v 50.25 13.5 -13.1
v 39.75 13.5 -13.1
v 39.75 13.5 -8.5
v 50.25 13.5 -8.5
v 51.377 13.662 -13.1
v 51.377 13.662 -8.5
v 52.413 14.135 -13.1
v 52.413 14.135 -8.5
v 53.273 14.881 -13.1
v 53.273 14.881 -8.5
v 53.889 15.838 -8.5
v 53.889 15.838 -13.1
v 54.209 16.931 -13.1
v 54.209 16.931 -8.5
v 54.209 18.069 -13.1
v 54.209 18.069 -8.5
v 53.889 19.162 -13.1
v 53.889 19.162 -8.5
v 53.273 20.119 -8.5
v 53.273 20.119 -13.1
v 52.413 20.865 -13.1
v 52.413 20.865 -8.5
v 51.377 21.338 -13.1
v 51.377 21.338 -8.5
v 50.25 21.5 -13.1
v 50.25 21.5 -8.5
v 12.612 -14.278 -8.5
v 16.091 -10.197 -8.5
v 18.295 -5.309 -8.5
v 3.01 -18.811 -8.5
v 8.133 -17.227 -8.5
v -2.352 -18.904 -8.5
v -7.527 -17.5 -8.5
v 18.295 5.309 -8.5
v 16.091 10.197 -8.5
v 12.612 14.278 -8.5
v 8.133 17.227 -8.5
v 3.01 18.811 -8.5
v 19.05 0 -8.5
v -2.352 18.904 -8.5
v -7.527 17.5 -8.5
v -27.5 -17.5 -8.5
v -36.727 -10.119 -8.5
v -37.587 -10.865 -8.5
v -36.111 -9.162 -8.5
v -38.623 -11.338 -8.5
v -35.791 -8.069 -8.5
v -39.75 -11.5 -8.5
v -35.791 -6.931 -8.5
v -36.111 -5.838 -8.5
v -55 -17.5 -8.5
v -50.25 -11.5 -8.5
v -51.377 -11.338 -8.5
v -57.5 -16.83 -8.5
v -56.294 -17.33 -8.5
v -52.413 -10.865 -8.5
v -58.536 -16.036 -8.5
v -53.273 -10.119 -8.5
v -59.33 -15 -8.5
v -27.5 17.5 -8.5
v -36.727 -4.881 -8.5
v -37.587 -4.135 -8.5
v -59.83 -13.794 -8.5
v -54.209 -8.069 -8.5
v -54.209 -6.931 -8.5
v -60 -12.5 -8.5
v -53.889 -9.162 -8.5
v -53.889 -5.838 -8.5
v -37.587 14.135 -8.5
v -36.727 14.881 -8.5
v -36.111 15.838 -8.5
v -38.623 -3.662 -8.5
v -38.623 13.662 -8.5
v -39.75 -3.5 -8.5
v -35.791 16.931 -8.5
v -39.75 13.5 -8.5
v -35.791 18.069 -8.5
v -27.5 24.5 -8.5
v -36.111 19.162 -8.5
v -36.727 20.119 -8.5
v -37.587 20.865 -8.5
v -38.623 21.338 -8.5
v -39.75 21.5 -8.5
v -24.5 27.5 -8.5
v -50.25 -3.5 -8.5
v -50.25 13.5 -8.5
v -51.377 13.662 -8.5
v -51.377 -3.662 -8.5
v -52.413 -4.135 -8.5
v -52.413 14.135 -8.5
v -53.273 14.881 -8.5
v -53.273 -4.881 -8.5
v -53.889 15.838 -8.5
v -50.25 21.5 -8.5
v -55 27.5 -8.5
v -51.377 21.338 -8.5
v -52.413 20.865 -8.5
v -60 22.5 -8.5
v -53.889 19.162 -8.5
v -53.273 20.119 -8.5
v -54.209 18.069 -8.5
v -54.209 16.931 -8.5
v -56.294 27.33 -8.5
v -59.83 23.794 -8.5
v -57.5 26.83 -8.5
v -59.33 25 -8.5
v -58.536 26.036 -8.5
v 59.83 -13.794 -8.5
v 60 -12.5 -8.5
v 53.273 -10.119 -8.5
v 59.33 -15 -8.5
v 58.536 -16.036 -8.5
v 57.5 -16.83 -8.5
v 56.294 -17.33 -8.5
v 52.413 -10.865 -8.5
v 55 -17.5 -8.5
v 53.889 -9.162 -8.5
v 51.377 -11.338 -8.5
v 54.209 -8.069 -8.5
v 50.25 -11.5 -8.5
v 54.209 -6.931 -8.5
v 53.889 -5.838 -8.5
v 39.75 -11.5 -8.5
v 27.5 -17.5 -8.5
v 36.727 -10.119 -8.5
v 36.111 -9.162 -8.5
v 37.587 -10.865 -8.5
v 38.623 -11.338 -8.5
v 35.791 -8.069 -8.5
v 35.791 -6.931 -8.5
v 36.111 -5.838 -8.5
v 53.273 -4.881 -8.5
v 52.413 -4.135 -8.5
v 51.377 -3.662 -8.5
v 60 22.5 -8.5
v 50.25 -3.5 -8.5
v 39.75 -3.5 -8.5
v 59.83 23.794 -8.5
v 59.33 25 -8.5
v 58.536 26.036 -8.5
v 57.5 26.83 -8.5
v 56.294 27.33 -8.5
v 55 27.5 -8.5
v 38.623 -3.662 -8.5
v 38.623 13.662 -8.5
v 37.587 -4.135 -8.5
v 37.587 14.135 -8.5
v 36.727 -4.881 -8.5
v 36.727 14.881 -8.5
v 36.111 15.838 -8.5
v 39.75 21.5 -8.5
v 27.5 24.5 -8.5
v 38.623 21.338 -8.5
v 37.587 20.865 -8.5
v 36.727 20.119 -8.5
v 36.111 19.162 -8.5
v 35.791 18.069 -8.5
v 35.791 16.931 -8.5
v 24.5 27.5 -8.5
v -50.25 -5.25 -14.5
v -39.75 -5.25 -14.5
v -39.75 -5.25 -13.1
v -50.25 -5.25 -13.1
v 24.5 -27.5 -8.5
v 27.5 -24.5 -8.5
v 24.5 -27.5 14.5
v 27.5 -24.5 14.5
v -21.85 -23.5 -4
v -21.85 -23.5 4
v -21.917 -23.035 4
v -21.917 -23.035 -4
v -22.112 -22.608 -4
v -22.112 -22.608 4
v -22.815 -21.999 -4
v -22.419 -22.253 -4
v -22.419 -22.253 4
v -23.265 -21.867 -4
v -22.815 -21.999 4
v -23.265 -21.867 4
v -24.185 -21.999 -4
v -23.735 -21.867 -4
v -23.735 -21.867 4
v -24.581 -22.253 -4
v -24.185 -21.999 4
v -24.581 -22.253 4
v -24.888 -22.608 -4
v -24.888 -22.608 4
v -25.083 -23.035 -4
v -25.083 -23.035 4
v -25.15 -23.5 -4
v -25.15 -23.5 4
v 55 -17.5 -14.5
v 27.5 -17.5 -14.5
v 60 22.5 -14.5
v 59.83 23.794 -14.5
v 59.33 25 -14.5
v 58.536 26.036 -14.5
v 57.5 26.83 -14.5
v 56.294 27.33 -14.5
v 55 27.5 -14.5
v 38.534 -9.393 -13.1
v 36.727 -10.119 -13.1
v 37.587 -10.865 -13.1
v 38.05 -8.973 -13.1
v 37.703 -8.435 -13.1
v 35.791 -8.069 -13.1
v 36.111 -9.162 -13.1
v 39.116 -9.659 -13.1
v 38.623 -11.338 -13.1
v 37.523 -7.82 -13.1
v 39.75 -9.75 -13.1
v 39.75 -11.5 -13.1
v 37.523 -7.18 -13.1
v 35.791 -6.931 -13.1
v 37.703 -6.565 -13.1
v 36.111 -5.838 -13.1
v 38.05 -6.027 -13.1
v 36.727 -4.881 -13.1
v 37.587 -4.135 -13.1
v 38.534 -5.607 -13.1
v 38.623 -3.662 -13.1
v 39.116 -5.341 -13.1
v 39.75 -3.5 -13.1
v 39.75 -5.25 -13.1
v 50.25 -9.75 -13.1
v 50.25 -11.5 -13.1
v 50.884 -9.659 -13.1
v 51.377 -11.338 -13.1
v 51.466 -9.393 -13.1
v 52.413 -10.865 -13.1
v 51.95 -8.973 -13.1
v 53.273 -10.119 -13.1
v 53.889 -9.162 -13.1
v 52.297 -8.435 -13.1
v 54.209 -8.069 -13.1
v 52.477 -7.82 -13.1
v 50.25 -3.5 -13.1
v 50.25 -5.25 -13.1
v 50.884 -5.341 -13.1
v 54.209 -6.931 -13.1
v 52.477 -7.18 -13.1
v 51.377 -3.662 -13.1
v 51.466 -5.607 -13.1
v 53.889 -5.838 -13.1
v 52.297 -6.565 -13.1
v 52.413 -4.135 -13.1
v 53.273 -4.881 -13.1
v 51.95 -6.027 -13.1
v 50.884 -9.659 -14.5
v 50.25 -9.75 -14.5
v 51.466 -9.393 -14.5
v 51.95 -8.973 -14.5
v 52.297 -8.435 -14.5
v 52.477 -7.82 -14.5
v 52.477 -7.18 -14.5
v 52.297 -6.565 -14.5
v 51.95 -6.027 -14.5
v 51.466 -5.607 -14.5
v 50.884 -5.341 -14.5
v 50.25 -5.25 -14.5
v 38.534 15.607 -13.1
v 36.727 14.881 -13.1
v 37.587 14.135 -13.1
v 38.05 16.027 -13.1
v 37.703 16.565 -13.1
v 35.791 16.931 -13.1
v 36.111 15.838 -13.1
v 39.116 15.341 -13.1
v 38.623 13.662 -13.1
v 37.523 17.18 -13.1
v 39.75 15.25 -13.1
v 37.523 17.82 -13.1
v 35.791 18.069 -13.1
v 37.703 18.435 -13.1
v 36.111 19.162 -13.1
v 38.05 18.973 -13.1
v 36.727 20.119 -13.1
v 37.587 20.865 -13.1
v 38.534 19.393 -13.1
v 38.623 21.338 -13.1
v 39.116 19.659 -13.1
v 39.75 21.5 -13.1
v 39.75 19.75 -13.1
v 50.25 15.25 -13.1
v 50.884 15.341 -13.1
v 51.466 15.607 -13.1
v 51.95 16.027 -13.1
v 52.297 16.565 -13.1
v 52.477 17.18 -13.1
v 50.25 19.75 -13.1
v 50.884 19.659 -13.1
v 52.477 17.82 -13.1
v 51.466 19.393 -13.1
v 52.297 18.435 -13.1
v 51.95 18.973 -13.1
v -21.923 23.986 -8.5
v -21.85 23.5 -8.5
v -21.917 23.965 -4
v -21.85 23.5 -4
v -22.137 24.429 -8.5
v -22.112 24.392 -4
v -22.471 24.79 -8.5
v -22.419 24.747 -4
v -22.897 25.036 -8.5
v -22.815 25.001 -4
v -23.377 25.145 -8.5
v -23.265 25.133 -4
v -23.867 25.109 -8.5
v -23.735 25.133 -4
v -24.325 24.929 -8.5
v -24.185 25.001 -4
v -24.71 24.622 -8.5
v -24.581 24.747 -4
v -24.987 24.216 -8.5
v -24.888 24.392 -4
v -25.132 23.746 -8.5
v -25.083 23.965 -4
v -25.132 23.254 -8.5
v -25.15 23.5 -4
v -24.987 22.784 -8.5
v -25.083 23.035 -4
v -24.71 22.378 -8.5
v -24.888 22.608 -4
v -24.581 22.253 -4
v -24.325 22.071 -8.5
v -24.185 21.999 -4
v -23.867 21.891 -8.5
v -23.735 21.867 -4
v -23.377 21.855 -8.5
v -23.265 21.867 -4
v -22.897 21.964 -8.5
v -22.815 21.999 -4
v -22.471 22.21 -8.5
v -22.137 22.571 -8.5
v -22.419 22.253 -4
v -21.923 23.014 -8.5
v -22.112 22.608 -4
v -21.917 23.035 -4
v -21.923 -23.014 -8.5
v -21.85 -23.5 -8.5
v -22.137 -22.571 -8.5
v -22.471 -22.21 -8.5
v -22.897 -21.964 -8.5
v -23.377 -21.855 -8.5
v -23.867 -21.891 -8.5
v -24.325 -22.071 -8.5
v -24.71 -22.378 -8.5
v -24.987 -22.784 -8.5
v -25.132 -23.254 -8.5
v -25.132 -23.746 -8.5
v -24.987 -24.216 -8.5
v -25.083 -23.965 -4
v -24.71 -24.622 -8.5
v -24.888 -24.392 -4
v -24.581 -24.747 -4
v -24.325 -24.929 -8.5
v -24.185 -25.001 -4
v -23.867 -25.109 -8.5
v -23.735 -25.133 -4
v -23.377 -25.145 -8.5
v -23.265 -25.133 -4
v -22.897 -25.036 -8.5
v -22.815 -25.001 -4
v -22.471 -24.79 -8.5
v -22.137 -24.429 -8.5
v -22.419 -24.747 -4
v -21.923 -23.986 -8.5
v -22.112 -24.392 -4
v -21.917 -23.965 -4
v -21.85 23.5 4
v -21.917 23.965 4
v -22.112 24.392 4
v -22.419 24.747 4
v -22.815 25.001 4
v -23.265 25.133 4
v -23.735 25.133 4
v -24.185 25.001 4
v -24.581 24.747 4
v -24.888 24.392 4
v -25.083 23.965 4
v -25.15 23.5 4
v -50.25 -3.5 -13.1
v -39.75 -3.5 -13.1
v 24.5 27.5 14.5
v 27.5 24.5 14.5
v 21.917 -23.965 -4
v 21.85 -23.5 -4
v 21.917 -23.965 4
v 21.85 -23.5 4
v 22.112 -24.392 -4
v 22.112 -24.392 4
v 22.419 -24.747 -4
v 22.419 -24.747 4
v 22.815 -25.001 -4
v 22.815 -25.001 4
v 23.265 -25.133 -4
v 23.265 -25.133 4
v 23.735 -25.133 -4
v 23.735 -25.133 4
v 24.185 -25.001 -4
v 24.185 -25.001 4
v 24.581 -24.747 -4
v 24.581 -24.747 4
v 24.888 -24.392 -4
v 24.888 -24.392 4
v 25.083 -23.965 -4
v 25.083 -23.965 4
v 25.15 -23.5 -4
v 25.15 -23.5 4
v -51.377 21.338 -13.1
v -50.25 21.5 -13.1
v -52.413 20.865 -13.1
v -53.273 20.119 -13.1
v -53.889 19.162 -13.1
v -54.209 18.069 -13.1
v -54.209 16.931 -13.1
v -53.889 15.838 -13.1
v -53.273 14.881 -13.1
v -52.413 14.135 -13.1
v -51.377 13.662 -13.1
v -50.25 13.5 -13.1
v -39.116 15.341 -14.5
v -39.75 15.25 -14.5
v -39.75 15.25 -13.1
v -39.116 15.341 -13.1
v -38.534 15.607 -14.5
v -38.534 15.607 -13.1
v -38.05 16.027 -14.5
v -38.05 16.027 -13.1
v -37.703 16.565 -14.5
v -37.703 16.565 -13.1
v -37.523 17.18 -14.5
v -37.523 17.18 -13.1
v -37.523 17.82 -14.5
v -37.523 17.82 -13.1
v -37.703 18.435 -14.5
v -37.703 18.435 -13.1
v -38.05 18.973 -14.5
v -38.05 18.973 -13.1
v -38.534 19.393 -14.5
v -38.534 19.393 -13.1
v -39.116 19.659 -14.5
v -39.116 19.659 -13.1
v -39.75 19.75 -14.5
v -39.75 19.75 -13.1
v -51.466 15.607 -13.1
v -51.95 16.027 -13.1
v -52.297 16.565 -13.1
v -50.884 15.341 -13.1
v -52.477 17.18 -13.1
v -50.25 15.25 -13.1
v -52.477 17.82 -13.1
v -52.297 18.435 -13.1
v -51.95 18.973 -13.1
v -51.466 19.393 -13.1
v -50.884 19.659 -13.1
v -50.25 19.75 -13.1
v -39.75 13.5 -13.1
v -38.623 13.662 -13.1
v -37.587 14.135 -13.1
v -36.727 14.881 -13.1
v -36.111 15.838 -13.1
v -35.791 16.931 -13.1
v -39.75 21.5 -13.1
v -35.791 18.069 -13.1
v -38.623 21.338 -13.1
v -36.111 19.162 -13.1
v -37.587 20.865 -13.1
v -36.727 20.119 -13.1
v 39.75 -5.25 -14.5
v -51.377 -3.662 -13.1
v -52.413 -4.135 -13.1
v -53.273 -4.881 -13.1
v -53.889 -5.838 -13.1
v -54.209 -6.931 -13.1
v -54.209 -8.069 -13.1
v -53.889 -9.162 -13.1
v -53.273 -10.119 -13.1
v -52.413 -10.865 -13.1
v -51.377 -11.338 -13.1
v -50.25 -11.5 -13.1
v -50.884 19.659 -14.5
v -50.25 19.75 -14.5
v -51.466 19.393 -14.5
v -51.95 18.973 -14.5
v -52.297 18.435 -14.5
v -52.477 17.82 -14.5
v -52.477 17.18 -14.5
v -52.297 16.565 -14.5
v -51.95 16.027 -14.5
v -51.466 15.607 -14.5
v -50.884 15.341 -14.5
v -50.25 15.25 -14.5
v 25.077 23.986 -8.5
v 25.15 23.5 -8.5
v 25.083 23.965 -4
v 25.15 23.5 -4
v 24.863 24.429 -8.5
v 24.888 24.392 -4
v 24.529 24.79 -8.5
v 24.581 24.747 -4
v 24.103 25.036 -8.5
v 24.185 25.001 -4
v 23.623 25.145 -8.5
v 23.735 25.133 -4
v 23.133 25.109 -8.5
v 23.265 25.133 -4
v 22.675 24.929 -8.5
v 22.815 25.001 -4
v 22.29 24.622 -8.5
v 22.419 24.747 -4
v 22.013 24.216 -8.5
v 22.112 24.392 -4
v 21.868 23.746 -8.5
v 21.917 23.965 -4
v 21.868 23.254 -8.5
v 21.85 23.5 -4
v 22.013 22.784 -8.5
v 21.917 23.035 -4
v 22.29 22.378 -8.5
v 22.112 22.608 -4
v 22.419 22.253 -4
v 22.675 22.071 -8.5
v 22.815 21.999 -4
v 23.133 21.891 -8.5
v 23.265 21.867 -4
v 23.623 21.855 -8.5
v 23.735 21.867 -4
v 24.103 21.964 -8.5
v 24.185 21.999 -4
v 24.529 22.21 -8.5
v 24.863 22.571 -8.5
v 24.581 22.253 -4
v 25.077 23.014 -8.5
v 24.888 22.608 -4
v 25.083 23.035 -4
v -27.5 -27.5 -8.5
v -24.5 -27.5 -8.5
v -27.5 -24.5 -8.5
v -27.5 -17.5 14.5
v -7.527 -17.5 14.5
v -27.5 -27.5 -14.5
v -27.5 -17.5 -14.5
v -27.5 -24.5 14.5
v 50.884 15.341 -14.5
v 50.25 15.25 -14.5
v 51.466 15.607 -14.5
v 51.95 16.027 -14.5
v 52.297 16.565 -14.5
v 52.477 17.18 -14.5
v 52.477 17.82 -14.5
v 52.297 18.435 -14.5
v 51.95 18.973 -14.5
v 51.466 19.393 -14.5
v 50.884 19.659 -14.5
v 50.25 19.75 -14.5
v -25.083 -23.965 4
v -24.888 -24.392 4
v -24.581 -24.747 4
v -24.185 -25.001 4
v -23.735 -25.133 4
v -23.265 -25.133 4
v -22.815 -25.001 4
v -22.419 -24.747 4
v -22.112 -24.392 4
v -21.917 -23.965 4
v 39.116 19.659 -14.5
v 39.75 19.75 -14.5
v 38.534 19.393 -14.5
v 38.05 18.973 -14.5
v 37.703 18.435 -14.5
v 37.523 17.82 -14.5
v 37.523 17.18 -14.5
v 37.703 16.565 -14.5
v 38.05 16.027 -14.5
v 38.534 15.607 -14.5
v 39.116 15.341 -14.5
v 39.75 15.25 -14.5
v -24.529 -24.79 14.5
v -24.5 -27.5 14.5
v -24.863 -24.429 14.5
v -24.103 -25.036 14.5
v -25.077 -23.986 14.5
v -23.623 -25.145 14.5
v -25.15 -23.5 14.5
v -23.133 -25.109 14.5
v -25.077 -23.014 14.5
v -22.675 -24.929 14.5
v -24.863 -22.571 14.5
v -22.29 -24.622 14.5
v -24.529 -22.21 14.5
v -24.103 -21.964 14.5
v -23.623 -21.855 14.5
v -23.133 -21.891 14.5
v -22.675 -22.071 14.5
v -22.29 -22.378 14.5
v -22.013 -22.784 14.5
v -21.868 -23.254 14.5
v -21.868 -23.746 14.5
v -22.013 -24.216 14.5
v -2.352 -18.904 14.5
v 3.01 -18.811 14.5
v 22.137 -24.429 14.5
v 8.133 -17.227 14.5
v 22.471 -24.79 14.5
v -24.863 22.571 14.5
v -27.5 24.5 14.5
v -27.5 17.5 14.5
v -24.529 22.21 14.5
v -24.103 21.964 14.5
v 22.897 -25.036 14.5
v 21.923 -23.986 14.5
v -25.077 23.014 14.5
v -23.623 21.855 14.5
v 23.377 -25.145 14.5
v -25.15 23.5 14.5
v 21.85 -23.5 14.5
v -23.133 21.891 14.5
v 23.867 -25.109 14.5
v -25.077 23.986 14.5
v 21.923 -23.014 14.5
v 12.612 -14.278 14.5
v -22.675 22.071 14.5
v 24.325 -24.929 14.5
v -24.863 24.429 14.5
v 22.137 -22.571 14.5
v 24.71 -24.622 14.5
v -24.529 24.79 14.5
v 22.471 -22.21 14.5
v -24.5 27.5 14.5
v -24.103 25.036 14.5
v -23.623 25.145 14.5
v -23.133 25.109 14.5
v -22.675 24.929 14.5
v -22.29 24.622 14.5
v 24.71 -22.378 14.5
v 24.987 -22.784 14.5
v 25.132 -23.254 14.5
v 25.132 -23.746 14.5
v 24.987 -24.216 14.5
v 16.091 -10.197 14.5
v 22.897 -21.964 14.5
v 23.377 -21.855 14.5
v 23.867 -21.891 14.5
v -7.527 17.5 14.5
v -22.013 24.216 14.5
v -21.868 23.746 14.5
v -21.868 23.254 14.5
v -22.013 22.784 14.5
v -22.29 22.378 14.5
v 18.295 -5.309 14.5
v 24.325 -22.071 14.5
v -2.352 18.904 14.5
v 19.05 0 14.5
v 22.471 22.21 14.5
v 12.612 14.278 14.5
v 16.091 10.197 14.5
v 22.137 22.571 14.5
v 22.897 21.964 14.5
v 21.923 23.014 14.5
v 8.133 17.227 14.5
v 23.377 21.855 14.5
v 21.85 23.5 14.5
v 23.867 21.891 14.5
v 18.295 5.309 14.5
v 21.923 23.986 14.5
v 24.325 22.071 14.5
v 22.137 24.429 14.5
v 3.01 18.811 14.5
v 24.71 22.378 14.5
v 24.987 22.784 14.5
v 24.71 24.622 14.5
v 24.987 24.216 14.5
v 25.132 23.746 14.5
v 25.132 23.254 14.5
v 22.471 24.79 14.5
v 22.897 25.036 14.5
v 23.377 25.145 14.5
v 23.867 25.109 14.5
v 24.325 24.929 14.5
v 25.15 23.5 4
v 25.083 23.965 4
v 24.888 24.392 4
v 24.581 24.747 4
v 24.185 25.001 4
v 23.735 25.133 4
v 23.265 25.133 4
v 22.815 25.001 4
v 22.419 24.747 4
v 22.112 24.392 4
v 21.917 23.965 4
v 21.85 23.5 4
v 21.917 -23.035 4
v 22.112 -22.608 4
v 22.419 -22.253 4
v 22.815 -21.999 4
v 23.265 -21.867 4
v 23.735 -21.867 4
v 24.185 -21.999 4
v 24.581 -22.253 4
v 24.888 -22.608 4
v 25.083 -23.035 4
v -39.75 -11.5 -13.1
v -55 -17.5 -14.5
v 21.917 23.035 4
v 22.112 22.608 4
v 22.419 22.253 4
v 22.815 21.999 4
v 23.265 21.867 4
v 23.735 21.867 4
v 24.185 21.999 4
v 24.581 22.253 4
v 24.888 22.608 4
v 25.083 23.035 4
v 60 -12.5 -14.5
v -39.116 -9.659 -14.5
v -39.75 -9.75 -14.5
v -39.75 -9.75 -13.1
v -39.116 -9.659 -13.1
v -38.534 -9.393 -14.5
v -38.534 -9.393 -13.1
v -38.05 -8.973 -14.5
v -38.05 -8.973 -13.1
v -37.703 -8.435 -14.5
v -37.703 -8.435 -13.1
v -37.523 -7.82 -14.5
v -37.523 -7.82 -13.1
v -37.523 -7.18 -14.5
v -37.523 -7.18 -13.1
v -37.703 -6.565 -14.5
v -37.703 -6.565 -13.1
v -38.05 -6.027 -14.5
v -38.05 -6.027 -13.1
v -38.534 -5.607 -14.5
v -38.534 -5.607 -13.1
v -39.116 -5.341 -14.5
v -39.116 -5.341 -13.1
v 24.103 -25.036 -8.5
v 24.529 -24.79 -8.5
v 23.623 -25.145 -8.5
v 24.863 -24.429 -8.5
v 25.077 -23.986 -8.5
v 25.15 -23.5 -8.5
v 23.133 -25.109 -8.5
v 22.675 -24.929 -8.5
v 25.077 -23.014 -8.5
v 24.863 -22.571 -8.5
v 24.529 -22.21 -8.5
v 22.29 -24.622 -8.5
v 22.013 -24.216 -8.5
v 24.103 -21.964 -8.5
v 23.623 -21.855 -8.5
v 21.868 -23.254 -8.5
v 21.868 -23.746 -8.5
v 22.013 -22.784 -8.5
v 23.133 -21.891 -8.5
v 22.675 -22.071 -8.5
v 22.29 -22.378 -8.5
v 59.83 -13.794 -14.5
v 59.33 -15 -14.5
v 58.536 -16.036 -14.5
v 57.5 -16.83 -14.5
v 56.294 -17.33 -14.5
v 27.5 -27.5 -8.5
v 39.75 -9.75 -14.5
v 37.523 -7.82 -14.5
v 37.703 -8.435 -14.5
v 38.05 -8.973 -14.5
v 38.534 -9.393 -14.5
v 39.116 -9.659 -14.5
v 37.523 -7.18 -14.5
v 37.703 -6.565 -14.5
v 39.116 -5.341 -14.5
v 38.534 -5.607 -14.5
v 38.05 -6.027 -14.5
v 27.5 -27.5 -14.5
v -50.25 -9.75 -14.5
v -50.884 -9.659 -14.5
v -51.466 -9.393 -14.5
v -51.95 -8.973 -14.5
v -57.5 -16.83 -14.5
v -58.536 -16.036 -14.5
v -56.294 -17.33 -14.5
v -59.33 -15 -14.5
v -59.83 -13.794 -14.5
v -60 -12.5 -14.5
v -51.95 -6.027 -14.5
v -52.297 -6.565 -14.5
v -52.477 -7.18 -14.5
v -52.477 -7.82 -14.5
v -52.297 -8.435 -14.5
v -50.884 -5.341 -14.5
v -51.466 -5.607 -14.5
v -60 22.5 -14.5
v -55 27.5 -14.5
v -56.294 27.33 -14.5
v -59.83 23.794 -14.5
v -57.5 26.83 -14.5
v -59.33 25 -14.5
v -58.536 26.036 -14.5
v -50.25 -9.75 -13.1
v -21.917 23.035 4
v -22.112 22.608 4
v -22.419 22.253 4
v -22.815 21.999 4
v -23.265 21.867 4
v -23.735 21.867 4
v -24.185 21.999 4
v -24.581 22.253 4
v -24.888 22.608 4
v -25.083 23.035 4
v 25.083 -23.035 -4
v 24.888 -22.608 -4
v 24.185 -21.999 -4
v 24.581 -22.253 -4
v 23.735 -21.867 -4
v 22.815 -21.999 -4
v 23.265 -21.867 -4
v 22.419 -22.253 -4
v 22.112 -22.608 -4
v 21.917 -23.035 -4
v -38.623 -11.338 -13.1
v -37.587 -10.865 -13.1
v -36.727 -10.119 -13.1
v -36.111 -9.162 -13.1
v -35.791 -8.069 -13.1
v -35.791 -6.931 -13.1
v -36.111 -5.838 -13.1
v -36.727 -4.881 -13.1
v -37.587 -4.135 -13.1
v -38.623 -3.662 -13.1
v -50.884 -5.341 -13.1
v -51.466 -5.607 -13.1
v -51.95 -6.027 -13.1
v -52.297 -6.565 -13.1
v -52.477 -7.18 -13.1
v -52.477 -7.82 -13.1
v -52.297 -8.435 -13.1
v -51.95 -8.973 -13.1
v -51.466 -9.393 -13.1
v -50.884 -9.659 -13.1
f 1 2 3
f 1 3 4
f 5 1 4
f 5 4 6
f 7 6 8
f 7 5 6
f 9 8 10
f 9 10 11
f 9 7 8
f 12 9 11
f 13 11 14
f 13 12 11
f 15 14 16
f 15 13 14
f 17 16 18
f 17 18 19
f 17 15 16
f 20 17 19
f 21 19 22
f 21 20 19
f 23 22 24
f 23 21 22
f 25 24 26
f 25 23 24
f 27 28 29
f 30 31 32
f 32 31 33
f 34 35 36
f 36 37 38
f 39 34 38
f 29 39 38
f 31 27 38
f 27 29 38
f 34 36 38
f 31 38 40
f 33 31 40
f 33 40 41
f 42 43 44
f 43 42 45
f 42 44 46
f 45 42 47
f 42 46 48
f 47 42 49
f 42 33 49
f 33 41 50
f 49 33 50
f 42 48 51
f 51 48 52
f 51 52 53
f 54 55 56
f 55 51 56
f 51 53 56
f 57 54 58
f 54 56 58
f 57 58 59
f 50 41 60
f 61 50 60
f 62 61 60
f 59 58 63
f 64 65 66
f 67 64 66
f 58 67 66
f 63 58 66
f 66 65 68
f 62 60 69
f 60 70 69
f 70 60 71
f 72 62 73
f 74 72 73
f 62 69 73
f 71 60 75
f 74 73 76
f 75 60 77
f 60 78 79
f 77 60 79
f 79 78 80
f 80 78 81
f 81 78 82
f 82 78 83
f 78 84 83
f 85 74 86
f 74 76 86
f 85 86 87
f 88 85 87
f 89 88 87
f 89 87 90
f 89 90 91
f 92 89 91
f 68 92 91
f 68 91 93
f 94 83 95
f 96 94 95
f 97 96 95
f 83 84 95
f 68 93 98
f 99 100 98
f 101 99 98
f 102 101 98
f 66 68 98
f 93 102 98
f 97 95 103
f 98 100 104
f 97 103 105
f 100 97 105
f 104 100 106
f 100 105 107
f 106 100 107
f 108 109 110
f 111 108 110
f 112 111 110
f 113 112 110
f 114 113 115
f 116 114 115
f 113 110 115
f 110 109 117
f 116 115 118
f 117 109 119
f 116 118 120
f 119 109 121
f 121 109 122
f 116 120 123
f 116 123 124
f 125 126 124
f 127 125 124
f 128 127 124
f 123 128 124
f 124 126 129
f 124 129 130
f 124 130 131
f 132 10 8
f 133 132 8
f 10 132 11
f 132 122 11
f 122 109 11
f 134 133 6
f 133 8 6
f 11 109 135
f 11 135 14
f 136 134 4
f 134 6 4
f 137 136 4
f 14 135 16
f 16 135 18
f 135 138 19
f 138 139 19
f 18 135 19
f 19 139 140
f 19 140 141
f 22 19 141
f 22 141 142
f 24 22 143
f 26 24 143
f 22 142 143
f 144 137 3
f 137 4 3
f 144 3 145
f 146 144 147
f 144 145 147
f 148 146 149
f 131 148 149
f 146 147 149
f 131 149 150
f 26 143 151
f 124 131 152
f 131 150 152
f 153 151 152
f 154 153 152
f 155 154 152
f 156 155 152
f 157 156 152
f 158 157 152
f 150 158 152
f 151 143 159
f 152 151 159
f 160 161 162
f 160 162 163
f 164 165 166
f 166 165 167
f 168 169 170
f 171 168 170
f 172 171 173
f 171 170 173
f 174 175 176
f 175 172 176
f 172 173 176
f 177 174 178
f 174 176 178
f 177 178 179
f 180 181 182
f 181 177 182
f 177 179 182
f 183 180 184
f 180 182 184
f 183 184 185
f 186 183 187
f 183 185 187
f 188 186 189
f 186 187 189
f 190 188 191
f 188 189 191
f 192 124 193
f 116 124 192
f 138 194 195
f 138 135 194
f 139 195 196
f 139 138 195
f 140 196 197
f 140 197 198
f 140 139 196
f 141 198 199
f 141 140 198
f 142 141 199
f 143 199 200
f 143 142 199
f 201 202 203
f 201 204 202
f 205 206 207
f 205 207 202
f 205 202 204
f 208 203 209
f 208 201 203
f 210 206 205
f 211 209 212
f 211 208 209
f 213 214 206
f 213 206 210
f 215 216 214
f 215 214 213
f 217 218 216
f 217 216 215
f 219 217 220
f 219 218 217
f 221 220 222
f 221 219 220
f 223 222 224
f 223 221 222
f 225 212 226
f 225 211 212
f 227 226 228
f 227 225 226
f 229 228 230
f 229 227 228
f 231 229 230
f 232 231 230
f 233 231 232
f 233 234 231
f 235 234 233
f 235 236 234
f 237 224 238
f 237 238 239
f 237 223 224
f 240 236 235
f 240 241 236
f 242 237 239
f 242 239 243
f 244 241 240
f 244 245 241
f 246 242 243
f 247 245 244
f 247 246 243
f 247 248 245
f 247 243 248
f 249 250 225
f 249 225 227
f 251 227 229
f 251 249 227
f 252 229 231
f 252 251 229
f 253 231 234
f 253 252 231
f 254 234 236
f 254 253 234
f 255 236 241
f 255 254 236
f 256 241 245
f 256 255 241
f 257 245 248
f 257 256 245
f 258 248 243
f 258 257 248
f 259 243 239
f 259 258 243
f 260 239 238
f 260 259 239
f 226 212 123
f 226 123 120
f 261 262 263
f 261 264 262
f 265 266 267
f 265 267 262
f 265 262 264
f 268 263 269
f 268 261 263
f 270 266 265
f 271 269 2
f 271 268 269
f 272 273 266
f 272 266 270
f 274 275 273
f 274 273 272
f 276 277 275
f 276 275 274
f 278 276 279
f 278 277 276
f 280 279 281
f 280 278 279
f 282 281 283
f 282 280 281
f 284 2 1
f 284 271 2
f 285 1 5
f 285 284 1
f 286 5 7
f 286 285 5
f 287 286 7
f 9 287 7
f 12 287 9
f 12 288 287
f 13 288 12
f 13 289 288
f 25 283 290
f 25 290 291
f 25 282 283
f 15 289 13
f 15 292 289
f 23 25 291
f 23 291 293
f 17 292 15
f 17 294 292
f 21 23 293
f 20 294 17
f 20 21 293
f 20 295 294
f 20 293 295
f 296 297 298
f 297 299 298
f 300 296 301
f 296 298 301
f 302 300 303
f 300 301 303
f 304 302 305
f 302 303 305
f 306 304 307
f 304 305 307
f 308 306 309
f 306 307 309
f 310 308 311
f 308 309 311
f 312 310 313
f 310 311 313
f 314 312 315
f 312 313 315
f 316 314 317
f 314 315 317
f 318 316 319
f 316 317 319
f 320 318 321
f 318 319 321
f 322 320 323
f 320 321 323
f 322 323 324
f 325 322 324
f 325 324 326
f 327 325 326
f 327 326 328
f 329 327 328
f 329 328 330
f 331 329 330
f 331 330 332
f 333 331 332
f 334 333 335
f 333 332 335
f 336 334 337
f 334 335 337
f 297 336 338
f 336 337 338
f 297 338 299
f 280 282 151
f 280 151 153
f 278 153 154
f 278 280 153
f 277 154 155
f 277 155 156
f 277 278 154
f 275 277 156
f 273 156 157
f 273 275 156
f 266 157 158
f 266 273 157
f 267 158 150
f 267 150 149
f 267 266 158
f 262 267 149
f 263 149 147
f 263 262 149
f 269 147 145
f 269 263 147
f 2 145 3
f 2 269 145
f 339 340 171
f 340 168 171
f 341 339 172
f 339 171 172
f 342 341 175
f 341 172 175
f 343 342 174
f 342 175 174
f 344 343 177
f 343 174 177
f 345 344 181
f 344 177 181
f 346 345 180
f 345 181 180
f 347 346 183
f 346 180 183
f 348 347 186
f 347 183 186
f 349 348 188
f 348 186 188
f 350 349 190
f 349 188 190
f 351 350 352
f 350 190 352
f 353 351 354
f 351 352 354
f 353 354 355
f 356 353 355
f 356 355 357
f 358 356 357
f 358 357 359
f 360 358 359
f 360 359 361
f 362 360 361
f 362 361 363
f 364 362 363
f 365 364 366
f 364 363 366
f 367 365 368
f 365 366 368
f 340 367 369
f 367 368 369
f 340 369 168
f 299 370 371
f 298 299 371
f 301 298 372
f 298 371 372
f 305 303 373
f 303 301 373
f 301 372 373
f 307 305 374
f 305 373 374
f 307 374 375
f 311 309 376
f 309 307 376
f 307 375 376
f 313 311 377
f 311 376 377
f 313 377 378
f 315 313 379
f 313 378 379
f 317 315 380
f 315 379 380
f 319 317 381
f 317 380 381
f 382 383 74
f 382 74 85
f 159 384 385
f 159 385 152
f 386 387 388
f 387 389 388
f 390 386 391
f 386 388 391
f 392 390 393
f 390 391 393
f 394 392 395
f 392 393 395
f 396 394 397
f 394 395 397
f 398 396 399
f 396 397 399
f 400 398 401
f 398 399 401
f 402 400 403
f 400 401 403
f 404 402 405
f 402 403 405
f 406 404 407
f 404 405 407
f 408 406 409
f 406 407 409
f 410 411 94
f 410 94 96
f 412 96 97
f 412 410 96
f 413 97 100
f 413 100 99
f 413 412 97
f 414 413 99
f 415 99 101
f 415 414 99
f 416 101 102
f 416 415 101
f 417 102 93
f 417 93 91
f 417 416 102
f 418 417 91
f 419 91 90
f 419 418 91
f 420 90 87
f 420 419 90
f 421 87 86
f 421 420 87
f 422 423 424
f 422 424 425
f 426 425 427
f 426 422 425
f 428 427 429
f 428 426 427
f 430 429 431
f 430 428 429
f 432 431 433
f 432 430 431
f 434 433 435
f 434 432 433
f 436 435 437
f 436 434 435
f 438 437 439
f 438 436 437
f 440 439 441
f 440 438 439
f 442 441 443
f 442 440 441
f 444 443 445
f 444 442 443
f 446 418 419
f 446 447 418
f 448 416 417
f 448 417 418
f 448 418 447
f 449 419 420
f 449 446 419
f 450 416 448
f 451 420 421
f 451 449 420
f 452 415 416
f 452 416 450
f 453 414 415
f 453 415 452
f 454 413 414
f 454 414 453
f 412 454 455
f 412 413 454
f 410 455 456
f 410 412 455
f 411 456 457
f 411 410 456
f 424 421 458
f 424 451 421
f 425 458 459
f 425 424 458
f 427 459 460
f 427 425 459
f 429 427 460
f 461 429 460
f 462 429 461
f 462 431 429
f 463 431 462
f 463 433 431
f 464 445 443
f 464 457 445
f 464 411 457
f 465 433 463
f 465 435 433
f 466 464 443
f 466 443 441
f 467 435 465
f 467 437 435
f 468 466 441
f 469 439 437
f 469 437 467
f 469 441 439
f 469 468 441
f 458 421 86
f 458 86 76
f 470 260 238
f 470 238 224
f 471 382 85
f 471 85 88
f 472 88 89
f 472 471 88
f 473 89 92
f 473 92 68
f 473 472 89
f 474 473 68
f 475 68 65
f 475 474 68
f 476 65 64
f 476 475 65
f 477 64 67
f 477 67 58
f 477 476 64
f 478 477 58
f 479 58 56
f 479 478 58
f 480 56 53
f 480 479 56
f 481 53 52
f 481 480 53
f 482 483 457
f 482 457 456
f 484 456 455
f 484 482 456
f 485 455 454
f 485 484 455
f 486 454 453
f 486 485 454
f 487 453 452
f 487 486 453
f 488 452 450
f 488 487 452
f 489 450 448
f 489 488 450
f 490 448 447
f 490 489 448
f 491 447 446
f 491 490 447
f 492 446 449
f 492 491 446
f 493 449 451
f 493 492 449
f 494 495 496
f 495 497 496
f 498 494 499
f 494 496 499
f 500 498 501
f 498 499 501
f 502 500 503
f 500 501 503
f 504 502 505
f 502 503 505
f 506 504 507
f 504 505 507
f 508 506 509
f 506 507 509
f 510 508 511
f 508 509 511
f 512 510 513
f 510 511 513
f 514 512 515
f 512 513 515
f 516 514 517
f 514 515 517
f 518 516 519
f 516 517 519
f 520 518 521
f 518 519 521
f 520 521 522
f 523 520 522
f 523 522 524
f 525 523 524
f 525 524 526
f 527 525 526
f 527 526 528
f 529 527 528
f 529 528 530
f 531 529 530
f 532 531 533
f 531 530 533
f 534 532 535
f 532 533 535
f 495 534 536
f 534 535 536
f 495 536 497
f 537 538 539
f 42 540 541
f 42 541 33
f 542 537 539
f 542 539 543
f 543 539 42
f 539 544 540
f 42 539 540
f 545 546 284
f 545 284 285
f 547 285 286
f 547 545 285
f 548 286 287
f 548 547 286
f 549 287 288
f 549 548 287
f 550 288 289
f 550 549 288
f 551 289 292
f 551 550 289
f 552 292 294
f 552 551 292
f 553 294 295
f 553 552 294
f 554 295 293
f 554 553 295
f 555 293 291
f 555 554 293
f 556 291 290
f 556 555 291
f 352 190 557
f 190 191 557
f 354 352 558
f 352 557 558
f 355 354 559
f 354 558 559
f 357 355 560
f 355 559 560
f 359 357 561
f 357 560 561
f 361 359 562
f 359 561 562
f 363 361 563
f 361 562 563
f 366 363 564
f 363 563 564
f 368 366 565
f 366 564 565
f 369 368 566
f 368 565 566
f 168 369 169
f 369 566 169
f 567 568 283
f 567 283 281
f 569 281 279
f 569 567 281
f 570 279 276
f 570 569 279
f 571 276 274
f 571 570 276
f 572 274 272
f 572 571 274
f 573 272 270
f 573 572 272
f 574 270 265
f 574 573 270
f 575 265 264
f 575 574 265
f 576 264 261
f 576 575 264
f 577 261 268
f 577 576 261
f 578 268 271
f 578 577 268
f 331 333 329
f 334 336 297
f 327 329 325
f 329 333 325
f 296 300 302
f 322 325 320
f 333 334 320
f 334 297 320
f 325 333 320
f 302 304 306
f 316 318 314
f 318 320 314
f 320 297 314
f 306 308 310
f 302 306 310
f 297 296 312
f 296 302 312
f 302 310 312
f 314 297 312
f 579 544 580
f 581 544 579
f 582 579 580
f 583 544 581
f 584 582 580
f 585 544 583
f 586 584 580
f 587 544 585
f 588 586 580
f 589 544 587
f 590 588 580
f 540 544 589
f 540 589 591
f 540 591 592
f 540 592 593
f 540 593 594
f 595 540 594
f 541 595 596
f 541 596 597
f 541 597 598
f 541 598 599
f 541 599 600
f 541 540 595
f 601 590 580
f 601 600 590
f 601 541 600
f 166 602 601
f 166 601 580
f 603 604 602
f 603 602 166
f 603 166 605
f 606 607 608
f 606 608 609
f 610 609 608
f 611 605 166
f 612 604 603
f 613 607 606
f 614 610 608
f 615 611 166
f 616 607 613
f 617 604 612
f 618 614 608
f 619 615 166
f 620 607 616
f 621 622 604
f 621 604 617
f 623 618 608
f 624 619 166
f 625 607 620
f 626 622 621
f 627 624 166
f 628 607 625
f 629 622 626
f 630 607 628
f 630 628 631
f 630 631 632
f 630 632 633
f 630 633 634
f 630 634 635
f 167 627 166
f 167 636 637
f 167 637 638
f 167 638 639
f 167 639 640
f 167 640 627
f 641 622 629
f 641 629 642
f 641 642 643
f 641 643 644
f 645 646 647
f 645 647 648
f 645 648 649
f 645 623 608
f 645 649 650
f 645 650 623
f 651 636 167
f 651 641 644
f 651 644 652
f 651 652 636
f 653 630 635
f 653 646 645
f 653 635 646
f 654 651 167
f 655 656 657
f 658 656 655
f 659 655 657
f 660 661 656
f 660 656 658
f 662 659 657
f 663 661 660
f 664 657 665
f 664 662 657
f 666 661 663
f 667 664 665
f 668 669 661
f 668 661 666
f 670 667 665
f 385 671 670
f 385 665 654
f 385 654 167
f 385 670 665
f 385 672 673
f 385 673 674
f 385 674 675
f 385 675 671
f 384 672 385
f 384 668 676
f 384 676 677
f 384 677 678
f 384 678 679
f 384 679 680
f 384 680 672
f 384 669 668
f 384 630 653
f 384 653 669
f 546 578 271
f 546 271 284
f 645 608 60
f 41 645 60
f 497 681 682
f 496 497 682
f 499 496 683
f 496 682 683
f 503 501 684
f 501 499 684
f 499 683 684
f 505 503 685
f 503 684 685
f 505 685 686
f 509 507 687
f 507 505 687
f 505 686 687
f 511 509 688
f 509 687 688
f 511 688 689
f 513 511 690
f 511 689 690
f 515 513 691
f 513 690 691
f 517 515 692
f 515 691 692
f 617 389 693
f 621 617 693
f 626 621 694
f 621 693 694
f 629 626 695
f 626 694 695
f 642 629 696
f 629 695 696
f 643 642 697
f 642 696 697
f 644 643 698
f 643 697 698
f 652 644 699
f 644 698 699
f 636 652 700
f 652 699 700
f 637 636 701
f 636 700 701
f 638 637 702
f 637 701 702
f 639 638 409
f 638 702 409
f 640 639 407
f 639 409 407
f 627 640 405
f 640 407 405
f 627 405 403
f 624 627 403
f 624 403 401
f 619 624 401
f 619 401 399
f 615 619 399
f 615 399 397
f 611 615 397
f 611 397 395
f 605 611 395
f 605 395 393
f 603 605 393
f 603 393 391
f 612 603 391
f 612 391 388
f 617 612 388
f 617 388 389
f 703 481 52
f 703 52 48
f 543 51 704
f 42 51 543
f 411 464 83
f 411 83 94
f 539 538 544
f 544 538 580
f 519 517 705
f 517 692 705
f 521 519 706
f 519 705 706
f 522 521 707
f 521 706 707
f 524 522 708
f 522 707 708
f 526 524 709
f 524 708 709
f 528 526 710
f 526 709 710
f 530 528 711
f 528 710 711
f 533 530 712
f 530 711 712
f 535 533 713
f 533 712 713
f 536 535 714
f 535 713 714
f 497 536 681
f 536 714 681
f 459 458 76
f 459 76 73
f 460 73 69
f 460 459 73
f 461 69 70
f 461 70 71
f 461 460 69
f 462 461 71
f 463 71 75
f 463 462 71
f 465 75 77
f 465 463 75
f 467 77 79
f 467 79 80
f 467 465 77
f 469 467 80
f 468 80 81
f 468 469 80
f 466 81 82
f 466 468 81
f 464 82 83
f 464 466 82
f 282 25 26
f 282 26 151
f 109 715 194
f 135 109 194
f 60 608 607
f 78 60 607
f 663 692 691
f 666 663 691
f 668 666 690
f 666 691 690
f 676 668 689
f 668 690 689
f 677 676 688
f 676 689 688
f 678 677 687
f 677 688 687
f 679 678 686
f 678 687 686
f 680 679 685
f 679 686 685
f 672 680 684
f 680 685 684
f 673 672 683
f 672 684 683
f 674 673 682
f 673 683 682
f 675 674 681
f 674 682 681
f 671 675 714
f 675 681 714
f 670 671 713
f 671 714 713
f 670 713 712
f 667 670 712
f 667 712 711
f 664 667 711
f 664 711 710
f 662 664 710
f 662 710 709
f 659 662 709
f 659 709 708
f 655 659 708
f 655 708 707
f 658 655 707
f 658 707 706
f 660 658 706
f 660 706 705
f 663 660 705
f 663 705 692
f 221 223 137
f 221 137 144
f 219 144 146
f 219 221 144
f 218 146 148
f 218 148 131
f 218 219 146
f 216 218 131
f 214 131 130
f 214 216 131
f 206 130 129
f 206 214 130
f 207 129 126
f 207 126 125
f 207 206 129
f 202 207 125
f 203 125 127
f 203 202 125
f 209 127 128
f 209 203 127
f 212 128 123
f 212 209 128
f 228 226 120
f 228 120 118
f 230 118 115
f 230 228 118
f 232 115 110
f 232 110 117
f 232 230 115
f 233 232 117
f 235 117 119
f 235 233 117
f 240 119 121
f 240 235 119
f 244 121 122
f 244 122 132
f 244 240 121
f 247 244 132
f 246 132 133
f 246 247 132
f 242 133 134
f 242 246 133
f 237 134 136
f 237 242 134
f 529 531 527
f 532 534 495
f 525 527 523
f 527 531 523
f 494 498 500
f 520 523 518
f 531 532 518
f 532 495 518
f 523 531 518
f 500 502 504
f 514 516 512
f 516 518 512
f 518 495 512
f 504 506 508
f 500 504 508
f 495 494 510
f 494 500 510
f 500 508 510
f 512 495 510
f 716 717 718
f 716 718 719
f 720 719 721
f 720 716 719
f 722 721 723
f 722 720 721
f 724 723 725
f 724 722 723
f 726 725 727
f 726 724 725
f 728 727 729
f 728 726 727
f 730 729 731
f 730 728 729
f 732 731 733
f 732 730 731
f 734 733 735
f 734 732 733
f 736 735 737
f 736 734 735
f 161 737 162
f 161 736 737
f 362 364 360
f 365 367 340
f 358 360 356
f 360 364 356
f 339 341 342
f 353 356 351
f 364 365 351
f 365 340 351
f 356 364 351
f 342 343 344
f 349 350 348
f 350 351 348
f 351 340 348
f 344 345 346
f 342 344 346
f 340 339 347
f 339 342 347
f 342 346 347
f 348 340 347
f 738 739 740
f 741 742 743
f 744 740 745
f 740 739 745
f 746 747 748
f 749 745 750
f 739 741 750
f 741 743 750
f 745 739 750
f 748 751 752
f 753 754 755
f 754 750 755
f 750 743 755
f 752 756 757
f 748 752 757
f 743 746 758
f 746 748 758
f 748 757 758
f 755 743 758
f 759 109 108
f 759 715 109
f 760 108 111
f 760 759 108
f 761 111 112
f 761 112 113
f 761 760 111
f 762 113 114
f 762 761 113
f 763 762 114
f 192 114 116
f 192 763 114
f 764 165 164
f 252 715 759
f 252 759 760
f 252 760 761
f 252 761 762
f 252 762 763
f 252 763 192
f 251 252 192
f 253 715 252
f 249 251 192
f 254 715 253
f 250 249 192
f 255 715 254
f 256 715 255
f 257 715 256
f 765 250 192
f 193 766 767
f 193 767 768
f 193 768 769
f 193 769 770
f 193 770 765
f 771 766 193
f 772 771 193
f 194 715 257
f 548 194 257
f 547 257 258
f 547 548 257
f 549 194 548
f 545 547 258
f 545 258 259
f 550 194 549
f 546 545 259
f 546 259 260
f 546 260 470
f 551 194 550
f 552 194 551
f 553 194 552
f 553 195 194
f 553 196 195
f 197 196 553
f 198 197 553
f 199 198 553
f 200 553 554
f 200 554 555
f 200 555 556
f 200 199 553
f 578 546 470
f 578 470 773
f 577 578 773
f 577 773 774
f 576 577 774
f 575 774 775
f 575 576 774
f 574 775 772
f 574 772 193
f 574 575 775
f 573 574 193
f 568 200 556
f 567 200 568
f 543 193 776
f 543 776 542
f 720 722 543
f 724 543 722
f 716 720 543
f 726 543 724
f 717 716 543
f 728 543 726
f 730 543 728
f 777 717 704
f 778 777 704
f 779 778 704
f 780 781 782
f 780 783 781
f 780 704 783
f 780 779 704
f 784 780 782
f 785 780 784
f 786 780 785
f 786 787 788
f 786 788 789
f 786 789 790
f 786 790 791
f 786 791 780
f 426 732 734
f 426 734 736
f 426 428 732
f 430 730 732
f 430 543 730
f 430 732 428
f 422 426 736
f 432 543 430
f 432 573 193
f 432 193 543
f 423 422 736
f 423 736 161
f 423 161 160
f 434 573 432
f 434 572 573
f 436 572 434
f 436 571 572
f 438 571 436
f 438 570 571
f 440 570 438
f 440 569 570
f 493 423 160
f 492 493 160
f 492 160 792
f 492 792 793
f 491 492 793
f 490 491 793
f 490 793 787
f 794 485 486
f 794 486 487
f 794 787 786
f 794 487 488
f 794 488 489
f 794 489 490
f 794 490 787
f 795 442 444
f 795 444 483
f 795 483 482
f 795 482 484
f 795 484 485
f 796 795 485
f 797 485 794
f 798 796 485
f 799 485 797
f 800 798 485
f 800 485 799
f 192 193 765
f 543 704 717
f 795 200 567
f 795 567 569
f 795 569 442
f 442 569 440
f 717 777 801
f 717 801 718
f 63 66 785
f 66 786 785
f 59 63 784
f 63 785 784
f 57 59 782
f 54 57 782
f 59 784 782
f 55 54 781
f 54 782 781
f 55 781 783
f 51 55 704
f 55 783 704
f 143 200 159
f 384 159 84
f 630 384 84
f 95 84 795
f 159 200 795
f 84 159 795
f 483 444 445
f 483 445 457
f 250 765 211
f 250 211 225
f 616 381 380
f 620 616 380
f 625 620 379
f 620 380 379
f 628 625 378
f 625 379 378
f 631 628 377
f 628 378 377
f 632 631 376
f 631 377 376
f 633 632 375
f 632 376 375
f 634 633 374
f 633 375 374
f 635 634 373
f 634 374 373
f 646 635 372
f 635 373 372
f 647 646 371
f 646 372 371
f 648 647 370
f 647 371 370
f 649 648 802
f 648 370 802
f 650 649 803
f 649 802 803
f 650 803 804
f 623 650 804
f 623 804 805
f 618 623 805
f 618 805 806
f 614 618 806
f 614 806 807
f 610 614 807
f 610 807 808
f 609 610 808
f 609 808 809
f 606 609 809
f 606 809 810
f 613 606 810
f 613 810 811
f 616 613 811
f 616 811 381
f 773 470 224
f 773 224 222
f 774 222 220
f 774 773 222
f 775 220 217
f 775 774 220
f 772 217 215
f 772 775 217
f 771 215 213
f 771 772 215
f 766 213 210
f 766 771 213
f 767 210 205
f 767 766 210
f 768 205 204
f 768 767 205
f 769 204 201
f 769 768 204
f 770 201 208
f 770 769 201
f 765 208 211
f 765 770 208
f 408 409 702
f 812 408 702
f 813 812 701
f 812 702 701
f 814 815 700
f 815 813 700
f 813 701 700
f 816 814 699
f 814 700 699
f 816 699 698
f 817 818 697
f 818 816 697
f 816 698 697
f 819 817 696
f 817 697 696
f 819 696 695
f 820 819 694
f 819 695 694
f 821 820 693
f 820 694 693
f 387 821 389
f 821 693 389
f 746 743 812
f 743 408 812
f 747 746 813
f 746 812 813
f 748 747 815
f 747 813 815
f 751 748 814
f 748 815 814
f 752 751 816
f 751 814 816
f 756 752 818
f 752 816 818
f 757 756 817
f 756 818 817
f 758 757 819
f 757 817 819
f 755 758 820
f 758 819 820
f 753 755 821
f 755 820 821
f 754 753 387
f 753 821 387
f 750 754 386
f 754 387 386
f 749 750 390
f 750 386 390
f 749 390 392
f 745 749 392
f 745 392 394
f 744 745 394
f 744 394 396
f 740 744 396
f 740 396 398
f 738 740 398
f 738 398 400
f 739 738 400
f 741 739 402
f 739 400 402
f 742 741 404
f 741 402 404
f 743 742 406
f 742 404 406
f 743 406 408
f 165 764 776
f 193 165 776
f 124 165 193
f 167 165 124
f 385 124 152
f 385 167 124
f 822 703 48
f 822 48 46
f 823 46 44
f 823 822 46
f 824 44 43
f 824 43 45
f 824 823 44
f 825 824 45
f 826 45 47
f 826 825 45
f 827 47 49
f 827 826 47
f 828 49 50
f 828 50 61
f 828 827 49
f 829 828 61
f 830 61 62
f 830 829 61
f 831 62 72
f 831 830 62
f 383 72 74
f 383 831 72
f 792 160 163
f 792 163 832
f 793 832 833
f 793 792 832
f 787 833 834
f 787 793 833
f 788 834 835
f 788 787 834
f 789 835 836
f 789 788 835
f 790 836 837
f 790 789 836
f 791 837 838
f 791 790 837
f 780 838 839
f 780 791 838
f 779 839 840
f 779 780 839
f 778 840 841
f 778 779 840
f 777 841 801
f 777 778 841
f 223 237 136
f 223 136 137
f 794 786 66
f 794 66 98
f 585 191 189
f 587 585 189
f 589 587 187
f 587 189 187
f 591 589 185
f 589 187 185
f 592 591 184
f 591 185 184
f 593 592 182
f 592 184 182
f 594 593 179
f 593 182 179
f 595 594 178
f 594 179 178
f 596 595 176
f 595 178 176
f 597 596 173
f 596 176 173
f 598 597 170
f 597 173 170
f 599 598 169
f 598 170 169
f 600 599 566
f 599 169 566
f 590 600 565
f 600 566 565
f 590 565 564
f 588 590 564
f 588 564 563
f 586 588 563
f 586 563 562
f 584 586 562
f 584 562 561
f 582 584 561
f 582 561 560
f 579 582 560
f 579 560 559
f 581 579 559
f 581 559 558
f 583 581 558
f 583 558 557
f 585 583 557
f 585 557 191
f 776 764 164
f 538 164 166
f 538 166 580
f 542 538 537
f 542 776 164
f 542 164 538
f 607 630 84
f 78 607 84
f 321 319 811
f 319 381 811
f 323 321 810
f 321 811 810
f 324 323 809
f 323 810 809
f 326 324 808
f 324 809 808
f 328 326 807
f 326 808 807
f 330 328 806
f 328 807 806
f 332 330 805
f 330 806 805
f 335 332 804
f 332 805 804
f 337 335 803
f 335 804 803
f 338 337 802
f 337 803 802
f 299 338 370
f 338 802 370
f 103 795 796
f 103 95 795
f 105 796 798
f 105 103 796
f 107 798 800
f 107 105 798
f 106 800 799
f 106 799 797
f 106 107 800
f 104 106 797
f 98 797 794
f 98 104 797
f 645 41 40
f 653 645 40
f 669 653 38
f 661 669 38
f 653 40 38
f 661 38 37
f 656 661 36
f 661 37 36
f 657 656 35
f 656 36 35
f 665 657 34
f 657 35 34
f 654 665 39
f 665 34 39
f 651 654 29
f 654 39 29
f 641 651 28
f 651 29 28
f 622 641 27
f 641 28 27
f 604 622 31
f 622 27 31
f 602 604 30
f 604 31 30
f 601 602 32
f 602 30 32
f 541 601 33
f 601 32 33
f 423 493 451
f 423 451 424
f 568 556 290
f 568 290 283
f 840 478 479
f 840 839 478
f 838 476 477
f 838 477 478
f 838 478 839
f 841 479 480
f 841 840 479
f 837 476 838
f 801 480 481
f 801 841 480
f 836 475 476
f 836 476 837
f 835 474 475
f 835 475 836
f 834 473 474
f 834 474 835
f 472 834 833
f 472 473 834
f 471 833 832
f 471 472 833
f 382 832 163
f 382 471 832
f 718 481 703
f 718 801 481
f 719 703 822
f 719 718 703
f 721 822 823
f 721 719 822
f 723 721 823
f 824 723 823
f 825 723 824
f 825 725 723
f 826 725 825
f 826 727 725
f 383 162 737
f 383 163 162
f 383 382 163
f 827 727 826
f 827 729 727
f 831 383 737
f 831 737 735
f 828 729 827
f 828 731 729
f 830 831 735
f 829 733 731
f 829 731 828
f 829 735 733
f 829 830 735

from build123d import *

# Parameters (mm, degrees)
SKETCH_1_W             = 55
SKETCH_1_H             = 55
EXTRUDE_1_DEPTH        = 14.5
SKETCH_2_R             = 19.05
CUT_EXTRUDE_1_DEPTH    = 49.512884886
SKETCH_3_W             = 40
SKETCH_3_H             = 35
CUT_EXTRUDE_2_DEPTH    = 32
CHAMFER_1_SIZE         = 3
HOLE_WIZARD_M4_1_D     = 3.3
HOLE_WIZARD_M4_1_DEPTH = 18.5
HOLE_WIZARD_M4_1_TIP   = 0.991420021
HOLE_WIZARD_M4_2_D     = 3.3
HOLE_WIZARD_M4_2_DEPTH = 18.5
HOLE_WIZARD_M4_2_TIP   = 0.991420021
SKETCH_13_W            = 120
SKETCH_13_H            = 55
EXTRUDE_2_DEPTH        = 6
SKETCH_14_W            = 32.5
SKETCH_14_H            = 10
CUT_EXTRUDE_3_DEPTH    = 10
HOLE_START             = -13.1
HOLE_WIZARD_1_DEPTH    = 4.6
HOLE_START_2           = -14.5
HOLE_WIZARD_1_2_DEPTH  = 1.4
FILLET_2_R             = 5


# Read off the part's stored shape, not the designer's step: 打孔尺寸(%根据)内六角圆柱头螺钉的类型1
with BuildPart() as part:
    # 草图1 → 凸台-拉伸1 (new, symmetric)
    with BuildSketch(Plane.XY):
        Rectangle(SKETCH_1_W, SKETCH_1_H)
    extrude(amount=EXTRUDE_1_DEPTH, both=True)

    # 草图2 → 切除-拉伸1 (cut, through all)
    with BuildSketch(Plane(origin=(0, 0, -14.5), x_dir=(-1, 0, 0), z_dir=(0, 0, -1))):
        Circle(SKETCH_2_R)
    extrude(amount=-CUT_EXTRUDE_1_DEPTH, mode=Mode.SUBTRACT)

    # 草图3 → 切除-拉伸2 (cut)
    with BuildSketch(Plane(origin=(-27.5, 0, 0), x_dir=(0, 0, -1), z_dir=(1, 0, 0))):
        Rectangle(SKETCH_3_W, SKETCH_3_H)
    extrude(amount=CUT_EXTRUDE_2_DEPTH, mode=Mode.SUBTRACT)

    # 倒角1
    chamfer_1_edges = [part.edges().sort_by_distance(p)[0] for p in [
        (27.5, -27.5, 0),
        (-27.5, -27.5, 0),
        (-27.5, 27.5, 0),
        (27.5, 27.5, 0),
    ]]
    chamfer(chamfer_1_edges, length=CHAMFER_1_SIZE)

    # M4 螺纹孔1
    with Locations(Plane(origin=(0, 0, -14.5), x_dir=(-1, 0, 0), z_dir=(0, 0, -1))):
        with Locations((-23.5, 23.5), (23.5, 23.5), (23.5, -23.5), (-23.5, -23.5)):
            Hole(HOLE_WIZARD_M4_1_D / 2, depth=HOLE_WIZARD_M4_1_DEPTH)
            with Locations((0, 0, -(HOLE_WIZARD_M4_1_DEPTH + HOLE_WIZARD_M4_1_TIP / 2))):  # 118° drill point
                Cone(0, HOLE_WIZARD_M4_1_D / 2, HOLE_WIZARD_M4_1_TIP, mode=Mode.SUBTRACT)

    # M4 螺纹孔2
    with Locations(Plane.XY.offset(14.5)):
        with Locations((23.5, 23.5), (-23.5, 23.5), (-23.5, -23.5), (23.5, -23.5)):
            Hole(HOLE_WIZARD_M4_2_D / 2, depth=HOLE_WIZARD_M4_2_DEPTH)
            with Locations((0, 0, -(HOLE_WIZARD_M4_2_DEPTH + HOLE_WIZARD_M4_2_TIP / 2))):  # 118° drill point
                Cone(0, HOLE_WIZARD_M4_2_D / 2, HOLE_WIZARD_M4_2_TIP, mode=Mode.SUBTRACT)

    # 草图13 → 凸台-拉伸2 (add)
    with BuildSketch(Plane(origin=(0, 0, -14.5), x_dir=(-1, 0, 0), z_dir=(0, 0, -1))):
        Rectangle(SKETCH_13_W, SKETCH_13_H)
    extrude(amount=-EXTRUDE_2_DEPTH)

    # 草图14 → 切除-拉伸3 (cut)
    with BuildSketch(Plane.XY.offset(-8.5)):
        with Locations((-43.75, -22.5)):
            Rectangle(SKETCH_14_W, SKETCH_14_H)
        with Locations((43.75, -22.5)):
            Rectangle(SKETCH_14_W, SKETCH_14_H)
    extrude(amount=-CUT_EXTRUDE_3_DEPTH, mode=Mode.SUBTRACT)

    # 打孔尺寸(%根据)内六角圆柱头螺钉的类型1 outline → 打孔尺寸(%根据)内六角圆柱头螺钉的类型1 (cut)
    with BuildSketch(Plane.XY.offset(HOLE_START)):
        with BuildLine():
            Line((39.75, -11.5), (50.25, -11.5))
            ThreePointArc((50.25, -11.5), (54.25, -7.5), (50.25, -3.5))
            Line((50.25, -3.5), (39.75, -3.5))
            ThreePointArc((39.75, -3.5), (35.75, -7.5), (39.75, -11.5))
        make_face()
        with BuildLine():
            ThreePointArc((-39.75, -11.5), (-35.75, -7.5), (-39.75, -3.5))
            Line((-39.75, -3.5), (-50.25, -3.5))
            ThreePointArc((-50.25, -3.5), (-54.25, -7.5), (-50.25, -11.5))
            Line((-50.25, -11.5), (-39.75, -11.5))
        make_face()
        with BuildLine():
            Line((39.75, 13.5), (50.25, 13.5))
            ThreePointArc((50.25, 13.5), (54.25, 17.5), (50.25, 21.5))
            Line((50.25, 21.5), (39.75, 21.5))
            ThreePointArc((39.75, 21.5), (35.75, 17.5), (39.75, 13.5))
        make_face()
        with BuildLine():
            ThreePointArc((-39.75, 13.5), (-35.75, 17.5), (-39.75, 21.5))
            Line((-39.75, 21.5), (-50.25, 21.5))
            ThreePointArc((-50.25, 21.5), (-54.25, 17.5), (-50.25, 13.5))
            Line((-50.25, 13.5), (-39.75, 13.5))
        make_face()
    extrude(amount=HOLE_WIZARD_1_DEPTH, mode=Mode.SUBTRACT)

    # Hole Wizard 1 2 outline → Hole Wizard 1 2 (cut)
    with BuildSketch(Plane.XY.offset(HOLE_START_2)):
        with BuildLine():
            Line((39.75, -9.75), (50.25, -9.75))
            ThreePointArc((50.25, -9.75), (52.5, -7.5), (50.25, -5.25))
            Line((50.25, -5.25), (39.75, -5.25))
            ThreePointArc((39.75, -5.25), (37.5, -7.5), (39.75, -9.75))
        make_face()
        with BuildLine():
            ThreePointArc((-39.75, -9.75), (-37.5, -7.5), (-39.75, -5.25))
            Line((-39.75, -5.25), (-50.25, -5.25))
            ThreePointArc((-50.25, -5.25), (-52.5, -7.5), (-50.25, -9.75))
            Line((-50.25, -9.75), (-39.75, -9.75))
        make_face()
        with BuildLine():
            Line((39.75, 15.25), (50.25, 15.25))
            ThreePointArc((50.25, 15.25), (52.5, 17.5), (50.25, 19.75))
            Line((50.25, 19.75), (39.75, 19.75))
            ThreePointArc((39.75, 19.75), (37.5, 17.5), (39.75, 15.25))
        make_face()
        with BuildLine():
            ThreePointArc((-39.75, 15.25), (-37.5, 17.5), (-39.75, 19.75))
            Line((-39.75, 19.75), (-50.25, 19.75))
            ThreePointArc((-50.25, 19.75), (-52.5, 17.5), (-50.25, 15.25))
            Line((-50.25, 15.25), (-39.75, 15.25))
        make_face()
    extrude(amount=HOLE_WIZARD_1_2_DEPTH, mode=Mode.SUBTRACT)

    # 圆角2
    fillet_2_edges = [part.edges().sort_by_distance(p)[0] for p in [
        (60, 27.5, -11.5),
        (-60, 27.5, -11.5),
        (-60, -17.5, -11.5),
        (60, -17.5, -11.5),
    ]]
    fillet(fillet_2_edges, radius=FILLET_2_R)


solid = part.part
